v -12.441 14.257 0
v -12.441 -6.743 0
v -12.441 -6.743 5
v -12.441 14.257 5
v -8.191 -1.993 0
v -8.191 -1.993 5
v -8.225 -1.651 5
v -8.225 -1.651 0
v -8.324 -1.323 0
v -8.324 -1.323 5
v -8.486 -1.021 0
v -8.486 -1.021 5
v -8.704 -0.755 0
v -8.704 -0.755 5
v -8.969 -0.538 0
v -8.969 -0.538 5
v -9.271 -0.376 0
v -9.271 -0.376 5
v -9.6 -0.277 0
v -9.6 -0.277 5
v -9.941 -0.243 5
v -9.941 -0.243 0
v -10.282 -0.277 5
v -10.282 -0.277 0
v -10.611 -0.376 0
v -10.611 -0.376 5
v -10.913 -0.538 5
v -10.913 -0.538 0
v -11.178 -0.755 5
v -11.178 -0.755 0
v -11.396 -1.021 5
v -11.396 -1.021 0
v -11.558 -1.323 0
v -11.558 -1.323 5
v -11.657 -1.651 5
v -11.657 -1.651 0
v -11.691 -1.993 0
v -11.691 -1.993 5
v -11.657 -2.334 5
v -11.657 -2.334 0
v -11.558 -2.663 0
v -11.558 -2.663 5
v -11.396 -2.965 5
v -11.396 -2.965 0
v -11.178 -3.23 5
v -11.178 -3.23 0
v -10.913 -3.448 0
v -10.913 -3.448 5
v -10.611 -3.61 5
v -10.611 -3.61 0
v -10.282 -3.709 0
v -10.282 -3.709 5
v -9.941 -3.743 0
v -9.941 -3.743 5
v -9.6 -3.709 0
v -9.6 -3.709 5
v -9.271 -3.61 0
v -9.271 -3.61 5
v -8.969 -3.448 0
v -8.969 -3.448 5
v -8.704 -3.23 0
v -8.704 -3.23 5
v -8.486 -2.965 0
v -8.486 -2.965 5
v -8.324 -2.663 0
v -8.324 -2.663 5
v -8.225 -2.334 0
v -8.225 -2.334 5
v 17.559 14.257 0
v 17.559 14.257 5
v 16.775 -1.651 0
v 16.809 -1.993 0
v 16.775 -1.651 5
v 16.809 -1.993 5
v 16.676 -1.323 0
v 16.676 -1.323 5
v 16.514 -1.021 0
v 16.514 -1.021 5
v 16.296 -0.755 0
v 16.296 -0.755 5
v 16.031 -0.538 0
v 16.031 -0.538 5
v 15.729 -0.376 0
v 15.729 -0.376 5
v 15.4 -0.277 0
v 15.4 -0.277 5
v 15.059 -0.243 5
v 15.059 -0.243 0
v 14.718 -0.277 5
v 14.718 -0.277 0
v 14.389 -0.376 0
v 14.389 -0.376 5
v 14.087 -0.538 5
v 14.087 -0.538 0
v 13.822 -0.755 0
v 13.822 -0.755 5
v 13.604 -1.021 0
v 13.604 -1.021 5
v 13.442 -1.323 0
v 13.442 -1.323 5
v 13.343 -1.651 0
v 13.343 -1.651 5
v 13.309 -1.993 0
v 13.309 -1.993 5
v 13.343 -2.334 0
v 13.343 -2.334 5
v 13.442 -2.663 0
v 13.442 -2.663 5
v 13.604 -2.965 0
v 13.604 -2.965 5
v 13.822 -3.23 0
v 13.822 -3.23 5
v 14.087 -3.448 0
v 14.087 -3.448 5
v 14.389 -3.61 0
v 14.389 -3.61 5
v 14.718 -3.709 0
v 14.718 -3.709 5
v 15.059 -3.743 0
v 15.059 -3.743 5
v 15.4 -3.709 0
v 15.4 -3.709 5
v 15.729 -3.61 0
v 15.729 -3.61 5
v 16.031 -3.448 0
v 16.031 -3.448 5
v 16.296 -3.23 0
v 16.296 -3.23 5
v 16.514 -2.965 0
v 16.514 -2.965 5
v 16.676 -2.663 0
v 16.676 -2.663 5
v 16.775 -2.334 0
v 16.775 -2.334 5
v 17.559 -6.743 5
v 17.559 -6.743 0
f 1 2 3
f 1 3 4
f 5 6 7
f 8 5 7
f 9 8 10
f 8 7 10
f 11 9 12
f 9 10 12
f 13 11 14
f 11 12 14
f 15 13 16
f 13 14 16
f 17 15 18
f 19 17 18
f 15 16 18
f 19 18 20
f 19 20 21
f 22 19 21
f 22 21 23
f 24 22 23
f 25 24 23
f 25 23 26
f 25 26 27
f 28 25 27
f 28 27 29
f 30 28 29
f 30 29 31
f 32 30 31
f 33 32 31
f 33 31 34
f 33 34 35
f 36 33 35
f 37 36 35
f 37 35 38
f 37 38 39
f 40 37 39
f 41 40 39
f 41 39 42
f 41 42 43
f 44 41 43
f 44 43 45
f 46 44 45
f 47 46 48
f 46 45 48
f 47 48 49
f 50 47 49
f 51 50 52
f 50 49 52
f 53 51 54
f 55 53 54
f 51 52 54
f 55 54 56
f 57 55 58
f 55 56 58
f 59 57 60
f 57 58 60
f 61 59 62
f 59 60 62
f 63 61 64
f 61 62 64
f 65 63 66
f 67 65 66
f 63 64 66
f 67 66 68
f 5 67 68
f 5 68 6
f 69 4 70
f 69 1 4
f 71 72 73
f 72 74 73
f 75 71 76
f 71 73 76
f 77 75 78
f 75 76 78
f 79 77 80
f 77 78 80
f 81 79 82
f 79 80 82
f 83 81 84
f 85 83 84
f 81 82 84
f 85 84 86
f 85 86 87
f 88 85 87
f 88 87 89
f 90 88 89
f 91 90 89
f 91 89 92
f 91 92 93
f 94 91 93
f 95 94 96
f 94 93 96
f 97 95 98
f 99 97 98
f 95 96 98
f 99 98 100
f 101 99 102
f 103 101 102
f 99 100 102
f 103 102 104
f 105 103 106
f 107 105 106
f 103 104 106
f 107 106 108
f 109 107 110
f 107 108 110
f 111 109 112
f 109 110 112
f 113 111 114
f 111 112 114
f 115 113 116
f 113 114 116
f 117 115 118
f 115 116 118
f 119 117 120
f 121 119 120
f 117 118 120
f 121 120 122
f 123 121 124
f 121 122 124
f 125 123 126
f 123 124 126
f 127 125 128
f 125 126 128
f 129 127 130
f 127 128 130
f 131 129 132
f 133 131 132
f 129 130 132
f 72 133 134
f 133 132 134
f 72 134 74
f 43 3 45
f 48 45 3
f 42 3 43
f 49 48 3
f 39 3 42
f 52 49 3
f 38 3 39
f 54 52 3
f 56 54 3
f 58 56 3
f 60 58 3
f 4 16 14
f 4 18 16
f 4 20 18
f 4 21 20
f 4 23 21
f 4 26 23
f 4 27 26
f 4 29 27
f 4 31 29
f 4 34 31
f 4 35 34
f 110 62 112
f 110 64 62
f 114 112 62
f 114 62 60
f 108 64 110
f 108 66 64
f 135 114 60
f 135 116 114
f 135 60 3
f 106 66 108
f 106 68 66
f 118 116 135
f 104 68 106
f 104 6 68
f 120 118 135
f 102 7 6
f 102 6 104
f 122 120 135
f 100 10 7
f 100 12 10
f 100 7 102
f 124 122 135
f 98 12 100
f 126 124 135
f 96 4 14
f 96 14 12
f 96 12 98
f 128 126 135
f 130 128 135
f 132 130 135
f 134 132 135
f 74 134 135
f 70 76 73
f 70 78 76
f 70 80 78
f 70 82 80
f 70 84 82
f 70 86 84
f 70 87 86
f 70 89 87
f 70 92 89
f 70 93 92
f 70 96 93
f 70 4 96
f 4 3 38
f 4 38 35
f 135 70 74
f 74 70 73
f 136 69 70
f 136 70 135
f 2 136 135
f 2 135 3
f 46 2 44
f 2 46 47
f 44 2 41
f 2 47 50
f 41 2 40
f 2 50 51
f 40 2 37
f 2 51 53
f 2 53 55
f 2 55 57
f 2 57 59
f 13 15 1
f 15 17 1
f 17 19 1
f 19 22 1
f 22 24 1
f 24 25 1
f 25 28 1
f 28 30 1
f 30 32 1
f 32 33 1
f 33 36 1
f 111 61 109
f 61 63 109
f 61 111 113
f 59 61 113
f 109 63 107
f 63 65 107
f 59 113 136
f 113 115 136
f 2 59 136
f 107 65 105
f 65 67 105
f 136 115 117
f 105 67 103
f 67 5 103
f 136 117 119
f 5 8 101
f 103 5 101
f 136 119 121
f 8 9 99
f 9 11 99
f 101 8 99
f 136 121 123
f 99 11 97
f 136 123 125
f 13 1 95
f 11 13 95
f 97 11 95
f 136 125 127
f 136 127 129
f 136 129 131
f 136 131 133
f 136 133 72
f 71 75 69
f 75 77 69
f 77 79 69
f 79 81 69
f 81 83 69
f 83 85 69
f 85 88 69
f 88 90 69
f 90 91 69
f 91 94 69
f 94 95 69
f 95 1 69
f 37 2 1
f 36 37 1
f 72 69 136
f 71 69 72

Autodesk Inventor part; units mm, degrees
ref_plane "YZ Plane" through (0, 0, 0) normal (1, 0, 0) x (0, 1, 0)
ref_plane "XZ Plane" through (0, 0, 0) normal (0, 1, 0) x (-1, 0, 0)
ref_plane "XY Plane" through (0, 0, 0) normal (0, 0, 1) x (1, 0, 0)
sketch "Boceto1" plane through (0, 0, 0) normal (0, 0, 1) x (1, 0, 0)
  line L0 (-12.441, 14.2571) -> (17.559, 14.2571)
  line L1 (17.559, 14.2571) -> (17.559, -15.7429)
  line L2 (17.559, -15.7429) -> (-12.441, -15.7429)
  line L3 (-12.441, -15.7429) -> (-12.441, 14.2571)
  point P0 (0, 0)
  dimension "d0" = 30
extrude "Extrusión1" add sketch "Boceto1" along normal blind 5
sketch "Boceto2" plane through (0, 0, 5) normal (0, 0, 1) x (1, 0, 0)
  line L0 (17.559, 14.2571) -> (17.559, -15.7429) projected
  line L1 (-12.441, 14.2571) -> (17.559, 14.2571) projected
  line L2 (-12.441, -15.7429) -> (-12.441, 14.2571) projected
  circle A0 centre (-9.941, -1.9929) radius 1.75
  circle A1 centre (15.059, -1.9929) radius 1.75
  point P0 (0, 0)
  dimension "d3" = 2.5
  dimension "d4" = 2.5
  dimension "d5" = 16.25
  dimension "d6" = 16.25
extrude "Extrusión2" cut sketch "Boceto2" against normal blind 5
move faces "Desplazar cara1" translate (0, 3, 0) faces at (7.559, -15.7429, 1.6667)
move faces "Desplazar cara2" translate (0, 5, 0) faces at (7.559, -12.7429, 1.6667)
move faces "Desplazar cara3" translate (0, 1, 0) faces at (7.559, -7.7429, 1.6667)
properties part number "tapa polea x 2"
